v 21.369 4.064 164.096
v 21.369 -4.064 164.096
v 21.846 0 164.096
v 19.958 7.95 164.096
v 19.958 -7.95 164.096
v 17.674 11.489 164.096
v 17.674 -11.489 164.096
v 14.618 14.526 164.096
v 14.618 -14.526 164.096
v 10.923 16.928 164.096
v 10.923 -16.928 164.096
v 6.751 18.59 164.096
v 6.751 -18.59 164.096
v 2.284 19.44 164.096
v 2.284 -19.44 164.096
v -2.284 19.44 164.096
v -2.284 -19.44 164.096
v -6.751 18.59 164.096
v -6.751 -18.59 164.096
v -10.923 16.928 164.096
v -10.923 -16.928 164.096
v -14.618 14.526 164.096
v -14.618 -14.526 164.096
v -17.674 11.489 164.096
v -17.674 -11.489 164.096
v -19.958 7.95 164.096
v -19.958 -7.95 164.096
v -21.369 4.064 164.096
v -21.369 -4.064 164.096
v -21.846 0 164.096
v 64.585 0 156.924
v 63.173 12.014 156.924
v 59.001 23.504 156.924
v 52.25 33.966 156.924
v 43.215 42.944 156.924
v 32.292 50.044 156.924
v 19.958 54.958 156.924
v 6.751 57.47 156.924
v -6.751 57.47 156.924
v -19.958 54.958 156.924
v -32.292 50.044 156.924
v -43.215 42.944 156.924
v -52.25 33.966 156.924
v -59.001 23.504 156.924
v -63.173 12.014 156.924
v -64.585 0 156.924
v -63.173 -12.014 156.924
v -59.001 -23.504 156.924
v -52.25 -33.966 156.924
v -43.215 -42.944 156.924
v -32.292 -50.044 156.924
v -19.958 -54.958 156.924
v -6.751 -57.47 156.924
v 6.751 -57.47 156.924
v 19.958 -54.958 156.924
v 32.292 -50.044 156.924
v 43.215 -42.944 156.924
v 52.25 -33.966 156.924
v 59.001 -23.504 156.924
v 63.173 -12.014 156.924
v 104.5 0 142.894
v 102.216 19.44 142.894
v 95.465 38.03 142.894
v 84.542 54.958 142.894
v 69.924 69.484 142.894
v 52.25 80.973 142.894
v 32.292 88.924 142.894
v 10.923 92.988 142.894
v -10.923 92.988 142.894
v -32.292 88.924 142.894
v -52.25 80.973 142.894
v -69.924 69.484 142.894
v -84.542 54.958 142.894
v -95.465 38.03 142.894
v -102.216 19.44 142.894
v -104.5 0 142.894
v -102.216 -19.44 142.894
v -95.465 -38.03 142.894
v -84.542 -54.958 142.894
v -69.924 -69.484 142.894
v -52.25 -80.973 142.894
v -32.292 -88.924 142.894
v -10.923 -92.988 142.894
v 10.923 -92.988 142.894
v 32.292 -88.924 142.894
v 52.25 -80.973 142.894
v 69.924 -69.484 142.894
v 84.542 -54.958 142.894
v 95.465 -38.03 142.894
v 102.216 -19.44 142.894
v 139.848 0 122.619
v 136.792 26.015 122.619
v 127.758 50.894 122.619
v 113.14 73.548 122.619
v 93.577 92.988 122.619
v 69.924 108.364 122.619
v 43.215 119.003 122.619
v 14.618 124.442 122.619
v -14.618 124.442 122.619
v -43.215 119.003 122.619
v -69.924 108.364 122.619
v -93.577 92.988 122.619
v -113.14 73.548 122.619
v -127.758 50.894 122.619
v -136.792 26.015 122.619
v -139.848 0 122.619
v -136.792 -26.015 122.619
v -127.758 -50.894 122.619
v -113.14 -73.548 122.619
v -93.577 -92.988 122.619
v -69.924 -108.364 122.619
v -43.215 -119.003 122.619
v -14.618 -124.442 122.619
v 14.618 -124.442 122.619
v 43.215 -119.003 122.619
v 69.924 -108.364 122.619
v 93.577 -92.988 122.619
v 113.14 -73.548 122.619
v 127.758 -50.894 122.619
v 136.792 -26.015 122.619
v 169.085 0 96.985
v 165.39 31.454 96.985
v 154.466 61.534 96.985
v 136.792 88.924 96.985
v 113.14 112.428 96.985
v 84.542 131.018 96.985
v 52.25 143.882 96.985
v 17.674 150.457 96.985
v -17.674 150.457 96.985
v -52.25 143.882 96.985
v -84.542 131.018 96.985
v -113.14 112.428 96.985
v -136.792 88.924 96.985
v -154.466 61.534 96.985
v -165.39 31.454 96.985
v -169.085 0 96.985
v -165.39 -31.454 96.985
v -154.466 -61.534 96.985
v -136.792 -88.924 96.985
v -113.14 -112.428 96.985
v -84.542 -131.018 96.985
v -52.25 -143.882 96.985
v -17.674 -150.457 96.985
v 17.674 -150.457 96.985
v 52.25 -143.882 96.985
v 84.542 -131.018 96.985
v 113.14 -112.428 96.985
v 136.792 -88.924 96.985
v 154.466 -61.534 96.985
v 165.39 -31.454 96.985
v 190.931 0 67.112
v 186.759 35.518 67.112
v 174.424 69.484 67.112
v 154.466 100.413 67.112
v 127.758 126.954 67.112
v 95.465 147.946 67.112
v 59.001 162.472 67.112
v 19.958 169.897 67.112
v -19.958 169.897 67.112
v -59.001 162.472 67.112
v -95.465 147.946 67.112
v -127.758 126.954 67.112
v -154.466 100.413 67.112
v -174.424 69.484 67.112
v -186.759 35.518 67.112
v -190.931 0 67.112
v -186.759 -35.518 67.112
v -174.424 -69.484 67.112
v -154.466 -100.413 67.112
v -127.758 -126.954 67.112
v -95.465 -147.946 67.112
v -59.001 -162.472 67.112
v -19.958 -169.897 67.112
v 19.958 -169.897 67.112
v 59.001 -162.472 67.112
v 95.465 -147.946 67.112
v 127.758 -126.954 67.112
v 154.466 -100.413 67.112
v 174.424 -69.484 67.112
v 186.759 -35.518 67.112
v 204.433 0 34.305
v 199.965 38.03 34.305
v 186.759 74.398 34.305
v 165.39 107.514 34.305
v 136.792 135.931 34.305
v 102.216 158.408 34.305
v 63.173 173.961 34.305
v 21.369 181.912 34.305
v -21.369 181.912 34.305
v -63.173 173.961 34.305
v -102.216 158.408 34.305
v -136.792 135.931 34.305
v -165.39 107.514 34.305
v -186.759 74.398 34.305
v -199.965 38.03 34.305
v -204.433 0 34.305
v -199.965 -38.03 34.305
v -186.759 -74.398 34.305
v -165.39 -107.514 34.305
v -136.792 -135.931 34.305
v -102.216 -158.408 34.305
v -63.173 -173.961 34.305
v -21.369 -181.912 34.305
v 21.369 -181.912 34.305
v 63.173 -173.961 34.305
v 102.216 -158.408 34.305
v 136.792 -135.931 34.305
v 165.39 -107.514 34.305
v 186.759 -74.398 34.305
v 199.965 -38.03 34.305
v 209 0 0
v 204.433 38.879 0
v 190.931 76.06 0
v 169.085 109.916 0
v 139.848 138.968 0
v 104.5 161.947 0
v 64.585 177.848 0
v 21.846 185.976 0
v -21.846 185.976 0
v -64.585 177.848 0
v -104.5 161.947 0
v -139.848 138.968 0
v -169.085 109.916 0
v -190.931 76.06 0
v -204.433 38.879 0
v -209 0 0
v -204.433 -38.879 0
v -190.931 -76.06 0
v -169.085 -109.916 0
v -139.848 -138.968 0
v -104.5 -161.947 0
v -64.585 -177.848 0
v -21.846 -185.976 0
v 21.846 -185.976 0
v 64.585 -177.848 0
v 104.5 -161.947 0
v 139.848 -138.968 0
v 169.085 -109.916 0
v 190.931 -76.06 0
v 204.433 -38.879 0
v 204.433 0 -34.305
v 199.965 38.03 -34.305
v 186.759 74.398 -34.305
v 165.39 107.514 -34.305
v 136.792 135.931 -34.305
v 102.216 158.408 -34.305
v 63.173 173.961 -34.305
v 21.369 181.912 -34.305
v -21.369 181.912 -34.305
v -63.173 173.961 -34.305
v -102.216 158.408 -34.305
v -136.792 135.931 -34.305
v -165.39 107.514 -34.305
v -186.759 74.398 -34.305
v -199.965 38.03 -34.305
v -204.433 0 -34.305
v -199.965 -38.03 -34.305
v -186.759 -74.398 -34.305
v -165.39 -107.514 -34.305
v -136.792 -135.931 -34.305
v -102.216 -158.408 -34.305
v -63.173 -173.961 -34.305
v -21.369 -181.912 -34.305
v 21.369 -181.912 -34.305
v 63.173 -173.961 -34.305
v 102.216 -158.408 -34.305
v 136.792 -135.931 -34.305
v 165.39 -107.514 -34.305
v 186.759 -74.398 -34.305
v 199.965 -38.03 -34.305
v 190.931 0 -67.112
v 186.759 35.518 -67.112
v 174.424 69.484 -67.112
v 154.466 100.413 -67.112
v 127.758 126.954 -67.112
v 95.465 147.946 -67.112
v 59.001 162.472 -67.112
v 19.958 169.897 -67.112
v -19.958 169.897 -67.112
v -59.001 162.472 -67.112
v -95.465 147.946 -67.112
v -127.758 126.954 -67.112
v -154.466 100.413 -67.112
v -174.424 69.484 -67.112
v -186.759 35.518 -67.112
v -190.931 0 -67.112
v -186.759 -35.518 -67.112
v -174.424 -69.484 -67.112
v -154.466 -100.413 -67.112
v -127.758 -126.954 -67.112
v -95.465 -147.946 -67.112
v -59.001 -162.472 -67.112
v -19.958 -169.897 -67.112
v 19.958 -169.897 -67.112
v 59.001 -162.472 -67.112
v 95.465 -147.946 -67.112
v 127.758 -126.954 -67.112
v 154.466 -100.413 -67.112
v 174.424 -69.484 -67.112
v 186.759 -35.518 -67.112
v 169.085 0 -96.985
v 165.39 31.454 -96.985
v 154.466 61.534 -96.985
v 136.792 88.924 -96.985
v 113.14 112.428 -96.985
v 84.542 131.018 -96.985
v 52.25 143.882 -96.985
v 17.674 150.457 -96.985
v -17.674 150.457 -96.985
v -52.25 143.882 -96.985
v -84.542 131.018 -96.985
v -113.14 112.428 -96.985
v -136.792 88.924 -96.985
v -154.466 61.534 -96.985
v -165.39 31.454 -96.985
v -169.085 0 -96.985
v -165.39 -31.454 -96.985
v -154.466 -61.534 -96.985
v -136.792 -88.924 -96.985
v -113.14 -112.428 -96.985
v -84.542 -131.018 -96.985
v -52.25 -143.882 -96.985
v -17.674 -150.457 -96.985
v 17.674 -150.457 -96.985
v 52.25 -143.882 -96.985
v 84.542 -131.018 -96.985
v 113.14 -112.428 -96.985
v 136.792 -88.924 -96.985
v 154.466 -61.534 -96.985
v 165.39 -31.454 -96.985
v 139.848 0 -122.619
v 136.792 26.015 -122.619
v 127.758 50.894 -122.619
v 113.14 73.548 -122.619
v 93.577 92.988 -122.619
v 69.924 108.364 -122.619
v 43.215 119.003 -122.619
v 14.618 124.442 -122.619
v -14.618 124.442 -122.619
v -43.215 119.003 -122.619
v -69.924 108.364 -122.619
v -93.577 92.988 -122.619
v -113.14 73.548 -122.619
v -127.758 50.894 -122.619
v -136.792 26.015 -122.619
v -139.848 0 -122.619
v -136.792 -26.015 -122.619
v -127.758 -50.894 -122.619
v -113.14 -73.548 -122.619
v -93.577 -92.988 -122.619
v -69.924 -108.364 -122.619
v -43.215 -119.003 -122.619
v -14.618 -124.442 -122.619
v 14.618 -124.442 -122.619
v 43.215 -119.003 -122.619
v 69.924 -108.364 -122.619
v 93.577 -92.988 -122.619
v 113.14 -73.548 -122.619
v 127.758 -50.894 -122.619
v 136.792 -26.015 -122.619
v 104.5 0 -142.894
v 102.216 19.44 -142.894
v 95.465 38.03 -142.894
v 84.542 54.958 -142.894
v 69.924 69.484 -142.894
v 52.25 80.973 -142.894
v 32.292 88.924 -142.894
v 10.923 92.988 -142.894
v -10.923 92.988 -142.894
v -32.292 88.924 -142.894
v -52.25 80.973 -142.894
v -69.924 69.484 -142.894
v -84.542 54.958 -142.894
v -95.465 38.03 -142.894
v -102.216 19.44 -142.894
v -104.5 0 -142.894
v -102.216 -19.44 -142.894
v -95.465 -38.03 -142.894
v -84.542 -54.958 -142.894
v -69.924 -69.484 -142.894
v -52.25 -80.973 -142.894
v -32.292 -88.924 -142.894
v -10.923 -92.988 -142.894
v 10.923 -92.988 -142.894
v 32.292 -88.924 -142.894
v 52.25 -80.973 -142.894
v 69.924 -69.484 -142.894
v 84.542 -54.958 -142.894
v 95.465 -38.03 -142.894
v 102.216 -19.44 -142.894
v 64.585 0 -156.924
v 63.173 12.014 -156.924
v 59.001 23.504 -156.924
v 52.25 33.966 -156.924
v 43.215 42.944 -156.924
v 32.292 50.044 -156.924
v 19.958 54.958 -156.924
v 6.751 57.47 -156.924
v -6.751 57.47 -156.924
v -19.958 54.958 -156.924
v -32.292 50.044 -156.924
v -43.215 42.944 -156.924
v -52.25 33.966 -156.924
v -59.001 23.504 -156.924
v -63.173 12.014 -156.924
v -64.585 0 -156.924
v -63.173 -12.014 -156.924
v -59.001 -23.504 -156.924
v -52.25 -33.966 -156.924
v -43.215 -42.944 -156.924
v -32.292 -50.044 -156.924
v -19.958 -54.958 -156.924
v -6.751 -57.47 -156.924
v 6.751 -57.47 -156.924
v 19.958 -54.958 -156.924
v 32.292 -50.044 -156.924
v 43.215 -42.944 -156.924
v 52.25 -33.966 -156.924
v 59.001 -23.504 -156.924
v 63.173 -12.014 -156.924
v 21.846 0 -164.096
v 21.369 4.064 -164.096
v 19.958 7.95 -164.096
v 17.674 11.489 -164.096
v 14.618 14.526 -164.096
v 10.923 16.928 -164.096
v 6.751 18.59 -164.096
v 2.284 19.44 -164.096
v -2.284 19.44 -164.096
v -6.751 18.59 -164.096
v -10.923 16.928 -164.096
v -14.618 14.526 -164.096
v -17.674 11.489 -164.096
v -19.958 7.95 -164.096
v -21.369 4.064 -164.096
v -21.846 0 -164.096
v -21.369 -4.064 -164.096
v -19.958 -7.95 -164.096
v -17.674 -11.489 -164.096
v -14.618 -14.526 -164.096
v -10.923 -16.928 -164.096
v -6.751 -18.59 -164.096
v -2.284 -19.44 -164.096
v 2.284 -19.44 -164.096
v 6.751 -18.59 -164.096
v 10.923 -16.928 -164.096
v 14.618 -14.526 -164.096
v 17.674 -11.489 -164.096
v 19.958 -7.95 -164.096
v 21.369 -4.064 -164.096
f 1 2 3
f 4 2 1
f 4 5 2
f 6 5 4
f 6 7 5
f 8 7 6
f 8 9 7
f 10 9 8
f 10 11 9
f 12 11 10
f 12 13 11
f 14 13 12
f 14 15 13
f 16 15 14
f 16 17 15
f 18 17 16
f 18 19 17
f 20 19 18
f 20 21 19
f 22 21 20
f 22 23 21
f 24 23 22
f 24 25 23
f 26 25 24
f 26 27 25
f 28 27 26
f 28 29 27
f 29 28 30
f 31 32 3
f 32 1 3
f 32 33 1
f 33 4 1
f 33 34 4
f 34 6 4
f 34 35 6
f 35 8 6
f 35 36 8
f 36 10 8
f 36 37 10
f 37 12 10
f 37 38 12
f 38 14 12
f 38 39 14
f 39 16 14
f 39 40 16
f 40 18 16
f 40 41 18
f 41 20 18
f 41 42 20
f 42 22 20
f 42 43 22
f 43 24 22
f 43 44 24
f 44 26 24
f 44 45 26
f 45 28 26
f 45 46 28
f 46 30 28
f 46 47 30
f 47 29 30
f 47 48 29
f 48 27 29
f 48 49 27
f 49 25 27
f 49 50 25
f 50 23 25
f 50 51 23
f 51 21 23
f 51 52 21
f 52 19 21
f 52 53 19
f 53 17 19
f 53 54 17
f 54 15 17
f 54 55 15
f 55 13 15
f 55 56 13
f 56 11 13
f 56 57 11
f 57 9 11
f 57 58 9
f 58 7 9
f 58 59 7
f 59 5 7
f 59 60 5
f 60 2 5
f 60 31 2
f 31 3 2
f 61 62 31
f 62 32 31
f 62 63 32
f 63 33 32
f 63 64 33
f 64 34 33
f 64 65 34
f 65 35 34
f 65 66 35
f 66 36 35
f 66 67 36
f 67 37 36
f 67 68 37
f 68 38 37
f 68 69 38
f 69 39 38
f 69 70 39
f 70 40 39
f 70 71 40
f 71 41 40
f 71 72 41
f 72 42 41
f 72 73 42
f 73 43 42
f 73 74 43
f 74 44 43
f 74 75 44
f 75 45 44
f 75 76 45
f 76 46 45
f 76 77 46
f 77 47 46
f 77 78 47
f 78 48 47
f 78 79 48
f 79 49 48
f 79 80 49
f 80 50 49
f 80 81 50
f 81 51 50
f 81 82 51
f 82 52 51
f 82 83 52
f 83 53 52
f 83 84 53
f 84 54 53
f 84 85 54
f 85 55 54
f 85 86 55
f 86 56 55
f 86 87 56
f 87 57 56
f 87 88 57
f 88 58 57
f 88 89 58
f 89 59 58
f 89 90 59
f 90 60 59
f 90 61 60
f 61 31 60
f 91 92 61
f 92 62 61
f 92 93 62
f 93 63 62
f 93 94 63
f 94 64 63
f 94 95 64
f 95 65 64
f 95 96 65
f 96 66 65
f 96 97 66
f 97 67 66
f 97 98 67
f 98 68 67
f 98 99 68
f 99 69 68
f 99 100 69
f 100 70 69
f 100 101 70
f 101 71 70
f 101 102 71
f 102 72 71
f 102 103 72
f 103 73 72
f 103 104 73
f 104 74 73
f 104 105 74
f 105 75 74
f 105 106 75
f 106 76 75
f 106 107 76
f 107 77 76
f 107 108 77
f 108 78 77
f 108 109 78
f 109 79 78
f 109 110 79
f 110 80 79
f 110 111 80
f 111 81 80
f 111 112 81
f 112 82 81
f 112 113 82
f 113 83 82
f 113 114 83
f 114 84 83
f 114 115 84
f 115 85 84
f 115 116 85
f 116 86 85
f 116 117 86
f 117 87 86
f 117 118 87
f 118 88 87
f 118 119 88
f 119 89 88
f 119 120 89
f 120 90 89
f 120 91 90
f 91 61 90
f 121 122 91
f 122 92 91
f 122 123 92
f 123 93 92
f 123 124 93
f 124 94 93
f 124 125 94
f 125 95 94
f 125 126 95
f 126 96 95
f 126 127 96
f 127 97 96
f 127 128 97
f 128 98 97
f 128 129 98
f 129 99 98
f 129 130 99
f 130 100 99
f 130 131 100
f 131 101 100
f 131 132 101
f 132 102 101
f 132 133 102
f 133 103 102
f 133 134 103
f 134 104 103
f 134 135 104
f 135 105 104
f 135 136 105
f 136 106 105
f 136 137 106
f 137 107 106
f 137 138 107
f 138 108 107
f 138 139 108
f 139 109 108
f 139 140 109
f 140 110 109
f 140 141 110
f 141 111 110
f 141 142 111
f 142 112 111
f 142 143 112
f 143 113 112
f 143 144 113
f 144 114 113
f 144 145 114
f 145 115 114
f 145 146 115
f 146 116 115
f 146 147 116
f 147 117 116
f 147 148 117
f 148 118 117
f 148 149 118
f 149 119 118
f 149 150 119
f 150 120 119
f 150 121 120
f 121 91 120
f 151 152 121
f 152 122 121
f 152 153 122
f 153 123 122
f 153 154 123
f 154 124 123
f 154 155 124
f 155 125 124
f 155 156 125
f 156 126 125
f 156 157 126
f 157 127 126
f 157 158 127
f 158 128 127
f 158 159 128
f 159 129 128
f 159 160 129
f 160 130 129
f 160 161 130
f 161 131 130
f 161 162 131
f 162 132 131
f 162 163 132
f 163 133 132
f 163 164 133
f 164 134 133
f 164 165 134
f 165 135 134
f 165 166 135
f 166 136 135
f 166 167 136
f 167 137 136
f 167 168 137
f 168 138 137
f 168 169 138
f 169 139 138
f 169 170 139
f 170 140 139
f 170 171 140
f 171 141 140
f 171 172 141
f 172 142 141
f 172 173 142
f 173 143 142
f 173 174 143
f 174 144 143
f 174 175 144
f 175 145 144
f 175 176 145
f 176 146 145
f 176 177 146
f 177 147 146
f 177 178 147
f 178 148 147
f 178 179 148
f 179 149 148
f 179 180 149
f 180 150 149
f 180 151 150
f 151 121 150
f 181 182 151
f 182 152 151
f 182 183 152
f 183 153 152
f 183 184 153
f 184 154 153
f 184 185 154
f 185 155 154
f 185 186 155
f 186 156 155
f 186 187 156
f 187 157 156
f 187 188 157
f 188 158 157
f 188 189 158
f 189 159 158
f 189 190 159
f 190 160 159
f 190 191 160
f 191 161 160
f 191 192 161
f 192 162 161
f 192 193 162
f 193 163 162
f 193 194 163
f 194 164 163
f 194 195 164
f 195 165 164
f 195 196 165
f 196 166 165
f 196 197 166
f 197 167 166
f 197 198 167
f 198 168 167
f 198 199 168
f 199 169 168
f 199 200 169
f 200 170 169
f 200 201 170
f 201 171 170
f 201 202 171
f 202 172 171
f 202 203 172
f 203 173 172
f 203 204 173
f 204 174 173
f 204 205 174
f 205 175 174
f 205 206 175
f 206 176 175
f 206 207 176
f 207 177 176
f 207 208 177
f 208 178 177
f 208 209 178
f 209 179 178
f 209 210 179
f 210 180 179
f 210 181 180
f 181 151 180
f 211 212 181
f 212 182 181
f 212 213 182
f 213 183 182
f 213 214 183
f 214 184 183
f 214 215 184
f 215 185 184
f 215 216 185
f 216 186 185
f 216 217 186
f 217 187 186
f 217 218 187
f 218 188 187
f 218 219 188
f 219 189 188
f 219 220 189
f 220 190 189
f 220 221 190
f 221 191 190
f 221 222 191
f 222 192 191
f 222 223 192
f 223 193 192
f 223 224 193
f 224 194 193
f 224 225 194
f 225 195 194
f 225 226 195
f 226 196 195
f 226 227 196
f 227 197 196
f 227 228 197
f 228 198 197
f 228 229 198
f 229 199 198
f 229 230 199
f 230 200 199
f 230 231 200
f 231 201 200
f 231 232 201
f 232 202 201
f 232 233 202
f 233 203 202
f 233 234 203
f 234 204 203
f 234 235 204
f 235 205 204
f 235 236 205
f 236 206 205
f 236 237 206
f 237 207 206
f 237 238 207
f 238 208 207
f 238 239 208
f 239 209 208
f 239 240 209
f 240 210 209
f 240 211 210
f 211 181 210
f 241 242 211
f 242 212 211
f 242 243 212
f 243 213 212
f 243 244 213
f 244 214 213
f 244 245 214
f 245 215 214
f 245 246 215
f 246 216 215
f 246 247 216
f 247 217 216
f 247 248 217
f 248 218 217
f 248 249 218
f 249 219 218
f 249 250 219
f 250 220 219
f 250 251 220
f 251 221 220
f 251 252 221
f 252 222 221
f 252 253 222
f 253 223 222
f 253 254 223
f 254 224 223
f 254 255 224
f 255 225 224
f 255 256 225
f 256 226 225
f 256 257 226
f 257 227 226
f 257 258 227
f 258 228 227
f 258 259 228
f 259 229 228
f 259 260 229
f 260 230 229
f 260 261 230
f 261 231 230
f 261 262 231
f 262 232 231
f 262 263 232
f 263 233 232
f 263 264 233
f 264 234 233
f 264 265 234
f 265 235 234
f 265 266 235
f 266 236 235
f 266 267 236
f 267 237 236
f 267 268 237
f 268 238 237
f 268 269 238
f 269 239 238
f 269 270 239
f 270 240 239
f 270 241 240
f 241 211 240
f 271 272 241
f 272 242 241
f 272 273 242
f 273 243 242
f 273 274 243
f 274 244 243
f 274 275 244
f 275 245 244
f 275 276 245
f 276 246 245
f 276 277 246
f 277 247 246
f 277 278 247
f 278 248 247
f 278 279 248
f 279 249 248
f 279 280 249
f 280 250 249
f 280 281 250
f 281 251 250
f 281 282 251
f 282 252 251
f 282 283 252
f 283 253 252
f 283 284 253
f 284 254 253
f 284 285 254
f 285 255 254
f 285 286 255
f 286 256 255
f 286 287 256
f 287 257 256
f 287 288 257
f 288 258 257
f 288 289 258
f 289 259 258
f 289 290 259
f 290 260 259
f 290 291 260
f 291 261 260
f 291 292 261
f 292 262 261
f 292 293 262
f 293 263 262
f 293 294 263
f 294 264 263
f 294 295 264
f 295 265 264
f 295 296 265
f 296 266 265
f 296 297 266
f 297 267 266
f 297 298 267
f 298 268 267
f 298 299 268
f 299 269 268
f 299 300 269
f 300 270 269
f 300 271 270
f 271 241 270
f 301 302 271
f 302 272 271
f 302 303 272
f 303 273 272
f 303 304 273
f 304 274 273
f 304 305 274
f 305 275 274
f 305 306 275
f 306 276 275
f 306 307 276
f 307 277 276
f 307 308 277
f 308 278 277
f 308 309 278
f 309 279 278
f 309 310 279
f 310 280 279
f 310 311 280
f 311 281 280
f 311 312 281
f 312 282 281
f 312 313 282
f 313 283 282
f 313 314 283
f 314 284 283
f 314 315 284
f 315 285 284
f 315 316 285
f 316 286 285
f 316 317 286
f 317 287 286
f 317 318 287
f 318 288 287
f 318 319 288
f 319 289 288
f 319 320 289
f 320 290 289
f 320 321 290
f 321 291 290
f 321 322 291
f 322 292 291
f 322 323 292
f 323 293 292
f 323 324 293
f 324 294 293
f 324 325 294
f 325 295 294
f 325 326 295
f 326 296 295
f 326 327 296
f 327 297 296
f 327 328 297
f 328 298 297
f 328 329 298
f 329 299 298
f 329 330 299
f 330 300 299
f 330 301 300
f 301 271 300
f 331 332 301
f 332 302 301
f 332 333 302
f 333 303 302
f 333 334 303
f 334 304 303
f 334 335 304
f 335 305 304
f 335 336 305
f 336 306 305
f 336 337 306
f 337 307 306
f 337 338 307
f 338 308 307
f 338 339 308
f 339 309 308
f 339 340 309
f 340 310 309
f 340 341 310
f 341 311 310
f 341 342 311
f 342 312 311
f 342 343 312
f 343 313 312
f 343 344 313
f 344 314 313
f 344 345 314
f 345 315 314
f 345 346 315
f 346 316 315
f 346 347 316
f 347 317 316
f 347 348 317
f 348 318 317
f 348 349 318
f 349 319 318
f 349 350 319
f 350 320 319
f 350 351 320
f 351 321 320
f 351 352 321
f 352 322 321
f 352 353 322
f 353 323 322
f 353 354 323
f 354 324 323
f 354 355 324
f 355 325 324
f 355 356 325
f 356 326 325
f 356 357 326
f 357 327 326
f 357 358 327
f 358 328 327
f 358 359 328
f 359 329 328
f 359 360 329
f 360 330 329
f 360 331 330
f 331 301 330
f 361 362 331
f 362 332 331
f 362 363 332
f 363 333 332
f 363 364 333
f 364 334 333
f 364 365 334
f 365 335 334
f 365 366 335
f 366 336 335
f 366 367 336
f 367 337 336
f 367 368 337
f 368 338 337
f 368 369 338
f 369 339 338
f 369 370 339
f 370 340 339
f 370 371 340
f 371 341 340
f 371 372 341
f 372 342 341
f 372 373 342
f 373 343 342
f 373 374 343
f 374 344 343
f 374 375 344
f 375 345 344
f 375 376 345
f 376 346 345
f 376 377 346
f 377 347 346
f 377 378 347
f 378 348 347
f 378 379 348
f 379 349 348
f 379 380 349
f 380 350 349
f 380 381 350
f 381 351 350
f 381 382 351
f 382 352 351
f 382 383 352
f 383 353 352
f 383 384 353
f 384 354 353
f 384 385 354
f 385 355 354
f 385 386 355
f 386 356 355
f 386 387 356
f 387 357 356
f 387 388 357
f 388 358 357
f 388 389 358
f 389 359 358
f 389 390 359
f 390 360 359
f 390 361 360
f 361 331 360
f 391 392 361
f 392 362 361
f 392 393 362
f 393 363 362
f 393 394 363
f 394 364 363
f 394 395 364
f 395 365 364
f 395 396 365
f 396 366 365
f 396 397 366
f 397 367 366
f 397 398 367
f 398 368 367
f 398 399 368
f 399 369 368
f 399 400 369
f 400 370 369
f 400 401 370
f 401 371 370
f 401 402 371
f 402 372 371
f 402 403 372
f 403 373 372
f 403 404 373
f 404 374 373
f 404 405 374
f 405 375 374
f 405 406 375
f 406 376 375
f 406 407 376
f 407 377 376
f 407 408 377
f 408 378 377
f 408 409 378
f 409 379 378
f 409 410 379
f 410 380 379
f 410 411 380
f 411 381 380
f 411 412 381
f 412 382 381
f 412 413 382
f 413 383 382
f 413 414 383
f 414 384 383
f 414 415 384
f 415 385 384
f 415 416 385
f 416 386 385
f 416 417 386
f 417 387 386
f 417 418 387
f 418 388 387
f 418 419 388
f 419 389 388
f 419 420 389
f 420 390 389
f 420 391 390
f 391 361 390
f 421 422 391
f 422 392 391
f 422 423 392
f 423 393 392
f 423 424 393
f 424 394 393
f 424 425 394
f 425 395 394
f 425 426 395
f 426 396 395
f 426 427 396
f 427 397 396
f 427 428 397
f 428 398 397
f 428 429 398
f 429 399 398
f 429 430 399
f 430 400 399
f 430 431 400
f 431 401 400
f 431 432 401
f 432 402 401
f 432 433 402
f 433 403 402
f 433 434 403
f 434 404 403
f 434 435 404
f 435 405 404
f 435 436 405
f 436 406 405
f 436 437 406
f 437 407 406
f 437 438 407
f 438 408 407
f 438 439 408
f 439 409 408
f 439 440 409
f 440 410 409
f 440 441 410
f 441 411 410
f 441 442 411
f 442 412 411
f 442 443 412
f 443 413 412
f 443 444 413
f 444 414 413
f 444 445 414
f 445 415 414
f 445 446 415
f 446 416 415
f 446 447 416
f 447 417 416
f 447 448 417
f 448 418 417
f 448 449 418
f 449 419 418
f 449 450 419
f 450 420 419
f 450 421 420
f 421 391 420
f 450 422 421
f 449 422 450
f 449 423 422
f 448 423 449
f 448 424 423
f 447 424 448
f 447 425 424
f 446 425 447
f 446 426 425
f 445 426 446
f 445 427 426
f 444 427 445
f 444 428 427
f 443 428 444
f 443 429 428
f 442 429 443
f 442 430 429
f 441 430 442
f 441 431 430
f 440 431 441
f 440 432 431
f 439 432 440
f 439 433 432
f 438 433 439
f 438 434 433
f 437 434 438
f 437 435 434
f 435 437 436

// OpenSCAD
// Generated by SolidPython 1.0.1 on 2020-07-29 00:46:54


scale(v = [19, 17, 15]) {
	sphere(r = 11);
}
/***********************************************
*********      SolidPython code:      **********
************************************************
 
# import packages: SolidPython
from solid import *
from solid.utils import *
from itertools import chain, combinations, permutations


class Resize:

    def __init__(self, scad_file):
        self.scad_file = scad_file
        #self.scad_file = import_scad(scad_file)
        # cone/cylinder param:
        self.r1 = 0
        self.r2 = 0
        self.h = 0
        # rectangular prism param:
        self.w = 0
        self.l = 0
        # ellipse param:
        self.r = 0

    # import OpenScad code (file name corresponds to shape)


    # classify shape + parameters
    def assign(self, param1, param2, param3):
        if self.scad_file == 'cone.scad':
            self.r1 = param1
            self.r2 = param2
            self.h = param3
        elif self.scad_file == 'cylinder.scad':
            self.r1 = param1
            self.r2 = param2
            self.h = param3
        elif self.scad_file == 'rectangularPrism.scad':
            self.h = param1
            self.l = param2
            self.w = param3
        else:
            self.r = param1
            self.h = param2

    # resize parameters
    def iterate(self):
        x = range(3, 20, 2)
        i = 1
        if self.scad_file == 'cone.scad':
            tempList = list(permutations(x, 2))
            for temp in tempList:
                param1 = temp[0]
                param2 = temp[1]
                filepath = 'produced_scad_files/' + 'cone' + str(param1) + '_' + str(param2) + '_' + '.scad'
                scad_render_to_file(cylinder(h=param1, r1=param2, r2=0), filepath)

        elif self.scad_file == 'cylinder.scad':
            tempList = list(permutations(x, 3))
            for temp in tempList:
                param1 = temp[0]
                param2 = temp[1]
                filepath = 'produced_scad_files/' + 'cylinder' + str(param1) + '_' + str(param2) + '_' + '.scad'
                scad_render_to_file(cylinder(h=param1, r1=param2, r2=param2), filepath)

        elif self.scad_file == 'rectangularPrism.scad':
            tempList = list(permutations(x, 3))
            for temp in tempList:
                param1 = temp[0]
                param2 = temp[1]
                param3 = temp[2]
                filepath = 'produced_scad_files/' + 'rectangularPrism' + str(param1) + '_' + str(param2) + '_' + str(
                    param3) + '.scad'
                scad_render_to_file(cube(size=(param1, param2, param3)), filepath)

        elif self.scad_file == 'ellipse.scad':
            tempList = list(permutations(x, 4))
            for temp in tempList:
                param1 = temp[0]
                param2 = temp[1]
                param3 = temp[2]
                param4 = temp[3]
                filepath = 'produced_scad_files/' + 'ellipse' + str(param1) + '_' + str(param2) + '_' + str(param3) + '_' + str(param4) + '.scad'
                scad_render_to_file(scale([param1, param2, param3])(sphere(r=param4)), filepath)

    def render_to_scadfile(self):
        scad_render_to_file(scad, 'example.scad') 
 
************************************************/
